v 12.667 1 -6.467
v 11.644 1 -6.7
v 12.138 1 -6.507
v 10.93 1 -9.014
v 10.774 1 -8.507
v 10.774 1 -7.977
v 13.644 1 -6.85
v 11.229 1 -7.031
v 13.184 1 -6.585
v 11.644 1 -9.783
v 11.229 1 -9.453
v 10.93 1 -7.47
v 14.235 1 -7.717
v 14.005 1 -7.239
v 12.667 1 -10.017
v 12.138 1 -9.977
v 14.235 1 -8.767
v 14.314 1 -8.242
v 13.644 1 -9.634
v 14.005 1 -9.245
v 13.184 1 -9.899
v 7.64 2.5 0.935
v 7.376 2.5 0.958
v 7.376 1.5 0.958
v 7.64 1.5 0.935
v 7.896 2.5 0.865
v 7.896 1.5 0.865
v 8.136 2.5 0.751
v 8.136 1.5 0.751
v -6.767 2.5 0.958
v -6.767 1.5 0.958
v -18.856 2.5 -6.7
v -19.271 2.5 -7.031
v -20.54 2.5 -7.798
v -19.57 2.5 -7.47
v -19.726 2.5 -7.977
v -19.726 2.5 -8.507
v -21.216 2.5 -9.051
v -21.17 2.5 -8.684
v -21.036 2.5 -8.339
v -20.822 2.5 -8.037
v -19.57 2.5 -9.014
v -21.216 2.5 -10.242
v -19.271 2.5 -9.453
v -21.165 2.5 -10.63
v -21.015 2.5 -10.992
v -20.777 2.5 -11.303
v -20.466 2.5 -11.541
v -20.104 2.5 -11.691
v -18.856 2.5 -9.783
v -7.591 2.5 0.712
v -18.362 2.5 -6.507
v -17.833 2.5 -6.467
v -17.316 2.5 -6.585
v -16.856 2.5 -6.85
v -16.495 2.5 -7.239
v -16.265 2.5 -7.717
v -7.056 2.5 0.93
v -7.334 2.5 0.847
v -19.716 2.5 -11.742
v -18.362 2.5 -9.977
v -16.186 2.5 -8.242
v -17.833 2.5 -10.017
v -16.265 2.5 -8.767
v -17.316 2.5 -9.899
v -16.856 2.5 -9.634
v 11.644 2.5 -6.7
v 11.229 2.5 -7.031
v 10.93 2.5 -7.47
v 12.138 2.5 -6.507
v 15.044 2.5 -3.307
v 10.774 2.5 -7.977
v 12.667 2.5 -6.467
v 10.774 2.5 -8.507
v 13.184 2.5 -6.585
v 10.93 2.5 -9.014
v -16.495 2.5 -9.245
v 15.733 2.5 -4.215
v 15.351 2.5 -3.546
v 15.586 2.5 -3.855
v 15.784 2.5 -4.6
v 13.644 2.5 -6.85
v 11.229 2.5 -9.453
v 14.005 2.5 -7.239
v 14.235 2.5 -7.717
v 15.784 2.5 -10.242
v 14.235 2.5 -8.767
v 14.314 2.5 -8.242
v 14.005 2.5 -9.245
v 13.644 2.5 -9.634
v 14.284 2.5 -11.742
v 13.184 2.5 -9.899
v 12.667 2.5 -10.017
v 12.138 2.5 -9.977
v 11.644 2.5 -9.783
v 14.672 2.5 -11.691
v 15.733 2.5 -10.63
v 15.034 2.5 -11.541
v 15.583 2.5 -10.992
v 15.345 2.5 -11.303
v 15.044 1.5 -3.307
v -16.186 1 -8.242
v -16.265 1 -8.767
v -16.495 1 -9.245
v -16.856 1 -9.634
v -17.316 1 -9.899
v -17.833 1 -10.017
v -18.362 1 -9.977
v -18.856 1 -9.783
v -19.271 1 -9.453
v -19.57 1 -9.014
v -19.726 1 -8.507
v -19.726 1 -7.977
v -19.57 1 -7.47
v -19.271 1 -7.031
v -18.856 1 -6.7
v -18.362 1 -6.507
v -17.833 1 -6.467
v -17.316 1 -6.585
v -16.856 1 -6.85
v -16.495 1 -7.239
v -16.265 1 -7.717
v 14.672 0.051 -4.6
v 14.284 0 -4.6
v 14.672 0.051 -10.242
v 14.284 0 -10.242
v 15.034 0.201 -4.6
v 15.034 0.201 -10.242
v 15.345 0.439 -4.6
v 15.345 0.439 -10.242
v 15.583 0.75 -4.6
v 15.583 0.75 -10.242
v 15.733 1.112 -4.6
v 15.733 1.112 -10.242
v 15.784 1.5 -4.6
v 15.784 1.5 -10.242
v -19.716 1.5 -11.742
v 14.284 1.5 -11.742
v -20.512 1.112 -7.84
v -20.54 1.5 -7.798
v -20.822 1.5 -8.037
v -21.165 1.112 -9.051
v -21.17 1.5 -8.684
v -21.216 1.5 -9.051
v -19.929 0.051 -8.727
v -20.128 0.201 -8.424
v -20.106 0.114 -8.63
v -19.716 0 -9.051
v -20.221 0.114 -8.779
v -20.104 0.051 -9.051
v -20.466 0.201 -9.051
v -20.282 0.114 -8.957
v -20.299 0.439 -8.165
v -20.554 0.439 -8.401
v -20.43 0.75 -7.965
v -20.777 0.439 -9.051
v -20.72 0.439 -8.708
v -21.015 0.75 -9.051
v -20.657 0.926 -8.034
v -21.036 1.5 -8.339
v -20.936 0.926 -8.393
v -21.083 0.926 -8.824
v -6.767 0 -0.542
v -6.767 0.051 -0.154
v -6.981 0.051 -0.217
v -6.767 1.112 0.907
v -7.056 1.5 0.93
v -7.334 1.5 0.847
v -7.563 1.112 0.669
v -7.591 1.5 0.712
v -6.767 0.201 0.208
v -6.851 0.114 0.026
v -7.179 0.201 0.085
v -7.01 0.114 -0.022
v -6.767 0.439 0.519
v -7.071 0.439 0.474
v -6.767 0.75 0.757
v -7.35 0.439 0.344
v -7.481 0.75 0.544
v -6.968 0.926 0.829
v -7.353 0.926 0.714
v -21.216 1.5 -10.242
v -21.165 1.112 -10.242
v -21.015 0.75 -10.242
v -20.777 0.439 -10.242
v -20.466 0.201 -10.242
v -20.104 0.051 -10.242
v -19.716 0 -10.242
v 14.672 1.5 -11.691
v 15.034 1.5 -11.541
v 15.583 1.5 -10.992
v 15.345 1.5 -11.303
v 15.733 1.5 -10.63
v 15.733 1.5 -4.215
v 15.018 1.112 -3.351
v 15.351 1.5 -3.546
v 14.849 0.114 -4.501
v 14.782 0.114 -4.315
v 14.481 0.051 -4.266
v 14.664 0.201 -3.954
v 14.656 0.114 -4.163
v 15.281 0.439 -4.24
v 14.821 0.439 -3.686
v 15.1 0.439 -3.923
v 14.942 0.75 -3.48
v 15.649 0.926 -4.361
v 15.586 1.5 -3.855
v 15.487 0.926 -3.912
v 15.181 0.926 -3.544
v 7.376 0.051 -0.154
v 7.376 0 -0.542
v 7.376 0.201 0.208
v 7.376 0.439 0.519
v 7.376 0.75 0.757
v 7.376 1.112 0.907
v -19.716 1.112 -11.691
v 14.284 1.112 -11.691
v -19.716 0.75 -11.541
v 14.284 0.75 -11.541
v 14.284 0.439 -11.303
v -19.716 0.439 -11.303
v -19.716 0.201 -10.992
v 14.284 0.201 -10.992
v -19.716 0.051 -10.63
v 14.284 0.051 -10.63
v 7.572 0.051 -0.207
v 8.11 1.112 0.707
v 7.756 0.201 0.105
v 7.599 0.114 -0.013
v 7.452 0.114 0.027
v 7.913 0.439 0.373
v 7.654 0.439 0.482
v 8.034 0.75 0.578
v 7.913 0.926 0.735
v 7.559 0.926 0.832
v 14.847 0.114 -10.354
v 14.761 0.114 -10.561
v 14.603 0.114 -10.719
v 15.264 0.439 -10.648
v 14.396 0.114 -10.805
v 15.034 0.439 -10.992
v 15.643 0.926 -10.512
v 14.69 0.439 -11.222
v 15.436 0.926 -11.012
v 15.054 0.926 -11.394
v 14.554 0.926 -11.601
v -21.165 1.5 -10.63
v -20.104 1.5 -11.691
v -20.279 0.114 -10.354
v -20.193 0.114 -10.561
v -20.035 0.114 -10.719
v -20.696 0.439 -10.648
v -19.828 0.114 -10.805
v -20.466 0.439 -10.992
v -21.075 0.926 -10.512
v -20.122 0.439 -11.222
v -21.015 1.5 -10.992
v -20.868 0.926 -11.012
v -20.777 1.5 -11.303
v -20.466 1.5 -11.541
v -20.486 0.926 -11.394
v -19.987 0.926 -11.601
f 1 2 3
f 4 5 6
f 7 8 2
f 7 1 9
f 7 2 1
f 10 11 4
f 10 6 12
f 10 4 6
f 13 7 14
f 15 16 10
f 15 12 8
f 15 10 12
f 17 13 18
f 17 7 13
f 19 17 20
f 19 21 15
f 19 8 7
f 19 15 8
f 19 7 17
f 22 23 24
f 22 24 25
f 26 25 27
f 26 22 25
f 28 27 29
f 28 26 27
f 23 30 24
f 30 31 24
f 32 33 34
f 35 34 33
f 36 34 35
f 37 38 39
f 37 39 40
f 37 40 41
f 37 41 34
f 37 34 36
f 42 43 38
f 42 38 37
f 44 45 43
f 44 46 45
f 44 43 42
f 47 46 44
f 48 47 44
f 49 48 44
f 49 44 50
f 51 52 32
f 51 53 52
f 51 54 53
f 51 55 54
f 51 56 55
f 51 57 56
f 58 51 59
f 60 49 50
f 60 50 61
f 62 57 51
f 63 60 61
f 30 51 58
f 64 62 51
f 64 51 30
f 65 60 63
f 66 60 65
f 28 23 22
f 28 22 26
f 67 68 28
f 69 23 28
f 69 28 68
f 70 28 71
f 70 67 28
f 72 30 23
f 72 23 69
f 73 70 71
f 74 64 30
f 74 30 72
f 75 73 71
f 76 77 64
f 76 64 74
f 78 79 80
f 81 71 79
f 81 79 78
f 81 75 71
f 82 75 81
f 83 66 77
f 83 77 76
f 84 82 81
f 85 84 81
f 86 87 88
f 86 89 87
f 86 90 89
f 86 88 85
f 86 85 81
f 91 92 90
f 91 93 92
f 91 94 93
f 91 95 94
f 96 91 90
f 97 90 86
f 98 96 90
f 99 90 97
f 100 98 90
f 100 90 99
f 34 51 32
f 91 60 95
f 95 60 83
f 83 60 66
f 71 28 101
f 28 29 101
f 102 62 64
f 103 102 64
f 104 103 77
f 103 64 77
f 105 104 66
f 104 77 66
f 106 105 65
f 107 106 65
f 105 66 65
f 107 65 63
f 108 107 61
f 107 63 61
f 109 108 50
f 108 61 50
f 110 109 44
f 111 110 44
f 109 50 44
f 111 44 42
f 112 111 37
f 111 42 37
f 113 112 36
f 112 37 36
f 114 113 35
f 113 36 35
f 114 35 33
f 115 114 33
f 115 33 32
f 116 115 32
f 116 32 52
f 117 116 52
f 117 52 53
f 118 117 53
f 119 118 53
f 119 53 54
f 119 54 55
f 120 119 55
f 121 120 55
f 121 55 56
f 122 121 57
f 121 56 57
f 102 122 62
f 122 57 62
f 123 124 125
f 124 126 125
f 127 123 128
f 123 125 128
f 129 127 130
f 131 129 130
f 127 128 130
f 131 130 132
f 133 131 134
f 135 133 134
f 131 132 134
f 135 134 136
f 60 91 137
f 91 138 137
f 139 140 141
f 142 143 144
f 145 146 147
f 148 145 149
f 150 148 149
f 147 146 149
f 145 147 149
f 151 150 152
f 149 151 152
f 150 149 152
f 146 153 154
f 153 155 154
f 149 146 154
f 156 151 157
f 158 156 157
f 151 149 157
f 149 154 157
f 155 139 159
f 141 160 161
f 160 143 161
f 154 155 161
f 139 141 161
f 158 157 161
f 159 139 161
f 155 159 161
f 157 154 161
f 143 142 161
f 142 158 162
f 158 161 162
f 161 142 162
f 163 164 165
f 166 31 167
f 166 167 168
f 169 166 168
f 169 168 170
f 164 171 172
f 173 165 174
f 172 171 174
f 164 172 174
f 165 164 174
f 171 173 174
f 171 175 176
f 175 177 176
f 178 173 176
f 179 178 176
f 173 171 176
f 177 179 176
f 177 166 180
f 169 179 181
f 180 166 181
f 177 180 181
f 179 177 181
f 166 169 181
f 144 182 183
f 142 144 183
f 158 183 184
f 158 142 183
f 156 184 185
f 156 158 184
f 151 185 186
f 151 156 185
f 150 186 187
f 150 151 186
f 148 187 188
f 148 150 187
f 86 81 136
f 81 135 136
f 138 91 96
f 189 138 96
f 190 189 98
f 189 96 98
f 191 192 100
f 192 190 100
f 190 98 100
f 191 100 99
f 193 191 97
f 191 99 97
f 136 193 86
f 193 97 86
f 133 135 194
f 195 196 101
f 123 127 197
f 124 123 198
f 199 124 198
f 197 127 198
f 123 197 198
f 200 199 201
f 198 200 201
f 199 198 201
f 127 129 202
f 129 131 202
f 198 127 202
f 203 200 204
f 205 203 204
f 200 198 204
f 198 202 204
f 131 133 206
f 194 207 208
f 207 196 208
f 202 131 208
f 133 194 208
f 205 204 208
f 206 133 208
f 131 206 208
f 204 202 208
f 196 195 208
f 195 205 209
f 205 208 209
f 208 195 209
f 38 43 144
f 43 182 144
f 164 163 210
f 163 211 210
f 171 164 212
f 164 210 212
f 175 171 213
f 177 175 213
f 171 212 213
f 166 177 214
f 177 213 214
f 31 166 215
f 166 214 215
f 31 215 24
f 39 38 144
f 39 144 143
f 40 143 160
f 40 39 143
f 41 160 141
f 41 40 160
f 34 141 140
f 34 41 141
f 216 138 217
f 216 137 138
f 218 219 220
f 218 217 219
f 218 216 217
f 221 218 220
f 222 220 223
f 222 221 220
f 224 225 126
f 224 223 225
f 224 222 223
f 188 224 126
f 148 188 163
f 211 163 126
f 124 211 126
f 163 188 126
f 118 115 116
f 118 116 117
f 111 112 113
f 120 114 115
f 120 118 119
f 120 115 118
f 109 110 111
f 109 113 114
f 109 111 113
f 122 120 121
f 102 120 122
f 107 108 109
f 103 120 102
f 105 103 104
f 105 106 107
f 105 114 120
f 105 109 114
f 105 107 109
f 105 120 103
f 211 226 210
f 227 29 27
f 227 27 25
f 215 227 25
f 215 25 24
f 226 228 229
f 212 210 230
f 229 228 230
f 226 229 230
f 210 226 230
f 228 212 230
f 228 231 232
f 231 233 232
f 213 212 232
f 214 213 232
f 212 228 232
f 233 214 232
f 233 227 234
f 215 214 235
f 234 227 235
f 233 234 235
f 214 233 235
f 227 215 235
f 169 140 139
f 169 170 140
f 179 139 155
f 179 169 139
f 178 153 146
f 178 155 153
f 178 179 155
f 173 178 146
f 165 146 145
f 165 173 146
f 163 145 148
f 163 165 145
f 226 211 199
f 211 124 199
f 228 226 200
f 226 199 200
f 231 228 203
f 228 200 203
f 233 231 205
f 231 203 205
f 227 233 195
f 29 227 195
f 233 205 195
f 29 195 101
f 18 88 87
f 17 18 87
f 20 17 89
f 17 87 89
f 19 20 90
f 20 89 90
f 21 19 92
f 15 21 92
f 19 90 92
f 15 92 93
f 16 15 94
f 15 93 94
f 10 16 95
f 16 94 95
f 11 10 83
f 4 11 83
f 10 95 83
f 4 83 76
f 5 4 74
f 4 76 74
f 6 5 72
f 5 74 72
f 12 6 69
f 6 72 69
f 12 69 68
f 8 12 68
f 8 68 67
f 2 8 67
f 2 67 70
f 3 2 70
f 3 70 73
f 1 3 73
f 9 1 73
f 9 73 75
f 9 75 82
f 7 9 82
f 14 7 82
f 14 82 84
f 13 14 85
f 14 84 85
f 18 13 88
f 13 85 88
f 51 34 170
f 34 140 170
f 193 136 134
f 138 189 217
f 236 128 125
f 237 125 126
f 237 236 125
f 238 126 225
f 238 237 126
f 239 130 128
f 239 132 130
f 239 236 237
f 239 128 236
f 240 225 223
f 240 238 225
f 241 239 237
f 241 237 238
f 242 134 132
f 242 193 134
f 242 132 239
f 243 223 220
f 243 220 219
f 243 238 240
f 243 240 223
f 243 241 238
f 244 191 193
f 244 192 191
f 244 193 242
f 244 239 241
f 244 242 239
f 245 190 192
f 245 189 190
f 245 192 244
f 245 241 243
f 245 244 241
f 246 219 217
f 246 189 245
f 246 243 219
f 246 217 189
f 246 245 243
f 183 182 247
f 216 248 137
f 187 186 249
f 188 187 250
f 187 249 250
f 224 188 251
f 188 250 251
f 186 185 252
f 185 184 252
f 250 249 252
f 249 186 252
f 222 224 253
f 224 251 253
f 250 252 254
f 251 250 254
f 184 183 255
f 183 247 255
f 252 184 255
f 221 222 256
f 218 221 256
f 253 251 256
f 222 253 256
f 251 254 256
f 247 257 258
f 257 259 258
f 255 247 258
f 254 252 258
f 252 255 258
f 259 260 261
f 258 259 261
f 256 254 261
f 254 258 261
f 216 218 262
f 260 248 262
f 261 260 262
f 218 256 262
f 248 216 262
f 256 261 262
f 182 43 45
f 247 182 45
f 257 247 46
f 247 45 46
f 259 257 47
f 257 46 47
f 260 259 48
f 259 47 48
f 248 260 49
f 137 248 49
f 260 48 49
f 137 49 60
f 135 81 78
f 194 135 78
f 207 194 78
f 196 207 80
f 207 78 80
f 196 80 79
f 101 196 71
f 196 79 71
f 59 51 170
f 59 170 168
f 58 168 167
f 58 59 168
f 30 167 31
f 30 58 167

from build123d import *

# Parameters (mm, degrees)
BOSS_EXTRUDE1_DEPTH = 2.5
SKETCH4_R           = 1.78
CUT_EXTRUDE1_DEPTH  = 1.5
FILLET1_R           = 1.5


with BuildPart() as part:
    # Sketch2 → Boss-Extrude1 (new body)
    with BuildSketch(Plane(origin=(0, 0, 0), x_dir=(1, 0, 0), z_dir=(0, 1, 0))):
        Polygon((-21.216153836, 11.741903429), (-21.216153836, 8.241903429), (-7.216153836, -0.958096571), (7.783846164, -0.958096571), (15.783846164, 3.741903429), (15.783846164, 11.741903429), align=None)
    extrude(amount=BOSS_EXTRUDE1_DEPTH)

    # Sketch4 → Cut-Extrude1 (cut)
    with BuildSketch(Plane(origin=(0, 2.5, 0), x_dir=(1, 0, 0), z_dir=(0, 1, 0))):
        with Locations((-17.966153836, 8.241903429)):
            Circle(SKETCH4_R)
        with Locations((12.533846164, 8.241903429)):
            Circle(SKETCH4_R)
    extrude(amount=-CUT_EXTRUDE1_DEPTH, mode=Mode.SUBTRACT)

    # Fillet1
    fillet1_edges = [part.edges().sort_by_distance(p)[0] for p in [
        (15.783846164, 1.25, -11.741903429),
        (15.783846164, 1.25, -3.741903429),
        (7.783846164, 1.25, 0.958096571),
        (-7.216153836, 1.25, 0.958096571),
        (-21.216153836, 1.25, -8.241903429),
        (-21.216153836, 1.25, -11.741903429),
        (15.783846164, 0, -7.741903429),
        (11.783846164, 0, -1.391903429),
        (0.283846164, 0, 0.958096571),
        (-14.216153836, 0, -3.641903429),
        (-21.216153836, 0, -9.991903429),
        (-2.716153836, 0, -11.741903429),
    ]]
    fillet(fillet1_edges, radius=FILLET1_R)


solid = part.part
